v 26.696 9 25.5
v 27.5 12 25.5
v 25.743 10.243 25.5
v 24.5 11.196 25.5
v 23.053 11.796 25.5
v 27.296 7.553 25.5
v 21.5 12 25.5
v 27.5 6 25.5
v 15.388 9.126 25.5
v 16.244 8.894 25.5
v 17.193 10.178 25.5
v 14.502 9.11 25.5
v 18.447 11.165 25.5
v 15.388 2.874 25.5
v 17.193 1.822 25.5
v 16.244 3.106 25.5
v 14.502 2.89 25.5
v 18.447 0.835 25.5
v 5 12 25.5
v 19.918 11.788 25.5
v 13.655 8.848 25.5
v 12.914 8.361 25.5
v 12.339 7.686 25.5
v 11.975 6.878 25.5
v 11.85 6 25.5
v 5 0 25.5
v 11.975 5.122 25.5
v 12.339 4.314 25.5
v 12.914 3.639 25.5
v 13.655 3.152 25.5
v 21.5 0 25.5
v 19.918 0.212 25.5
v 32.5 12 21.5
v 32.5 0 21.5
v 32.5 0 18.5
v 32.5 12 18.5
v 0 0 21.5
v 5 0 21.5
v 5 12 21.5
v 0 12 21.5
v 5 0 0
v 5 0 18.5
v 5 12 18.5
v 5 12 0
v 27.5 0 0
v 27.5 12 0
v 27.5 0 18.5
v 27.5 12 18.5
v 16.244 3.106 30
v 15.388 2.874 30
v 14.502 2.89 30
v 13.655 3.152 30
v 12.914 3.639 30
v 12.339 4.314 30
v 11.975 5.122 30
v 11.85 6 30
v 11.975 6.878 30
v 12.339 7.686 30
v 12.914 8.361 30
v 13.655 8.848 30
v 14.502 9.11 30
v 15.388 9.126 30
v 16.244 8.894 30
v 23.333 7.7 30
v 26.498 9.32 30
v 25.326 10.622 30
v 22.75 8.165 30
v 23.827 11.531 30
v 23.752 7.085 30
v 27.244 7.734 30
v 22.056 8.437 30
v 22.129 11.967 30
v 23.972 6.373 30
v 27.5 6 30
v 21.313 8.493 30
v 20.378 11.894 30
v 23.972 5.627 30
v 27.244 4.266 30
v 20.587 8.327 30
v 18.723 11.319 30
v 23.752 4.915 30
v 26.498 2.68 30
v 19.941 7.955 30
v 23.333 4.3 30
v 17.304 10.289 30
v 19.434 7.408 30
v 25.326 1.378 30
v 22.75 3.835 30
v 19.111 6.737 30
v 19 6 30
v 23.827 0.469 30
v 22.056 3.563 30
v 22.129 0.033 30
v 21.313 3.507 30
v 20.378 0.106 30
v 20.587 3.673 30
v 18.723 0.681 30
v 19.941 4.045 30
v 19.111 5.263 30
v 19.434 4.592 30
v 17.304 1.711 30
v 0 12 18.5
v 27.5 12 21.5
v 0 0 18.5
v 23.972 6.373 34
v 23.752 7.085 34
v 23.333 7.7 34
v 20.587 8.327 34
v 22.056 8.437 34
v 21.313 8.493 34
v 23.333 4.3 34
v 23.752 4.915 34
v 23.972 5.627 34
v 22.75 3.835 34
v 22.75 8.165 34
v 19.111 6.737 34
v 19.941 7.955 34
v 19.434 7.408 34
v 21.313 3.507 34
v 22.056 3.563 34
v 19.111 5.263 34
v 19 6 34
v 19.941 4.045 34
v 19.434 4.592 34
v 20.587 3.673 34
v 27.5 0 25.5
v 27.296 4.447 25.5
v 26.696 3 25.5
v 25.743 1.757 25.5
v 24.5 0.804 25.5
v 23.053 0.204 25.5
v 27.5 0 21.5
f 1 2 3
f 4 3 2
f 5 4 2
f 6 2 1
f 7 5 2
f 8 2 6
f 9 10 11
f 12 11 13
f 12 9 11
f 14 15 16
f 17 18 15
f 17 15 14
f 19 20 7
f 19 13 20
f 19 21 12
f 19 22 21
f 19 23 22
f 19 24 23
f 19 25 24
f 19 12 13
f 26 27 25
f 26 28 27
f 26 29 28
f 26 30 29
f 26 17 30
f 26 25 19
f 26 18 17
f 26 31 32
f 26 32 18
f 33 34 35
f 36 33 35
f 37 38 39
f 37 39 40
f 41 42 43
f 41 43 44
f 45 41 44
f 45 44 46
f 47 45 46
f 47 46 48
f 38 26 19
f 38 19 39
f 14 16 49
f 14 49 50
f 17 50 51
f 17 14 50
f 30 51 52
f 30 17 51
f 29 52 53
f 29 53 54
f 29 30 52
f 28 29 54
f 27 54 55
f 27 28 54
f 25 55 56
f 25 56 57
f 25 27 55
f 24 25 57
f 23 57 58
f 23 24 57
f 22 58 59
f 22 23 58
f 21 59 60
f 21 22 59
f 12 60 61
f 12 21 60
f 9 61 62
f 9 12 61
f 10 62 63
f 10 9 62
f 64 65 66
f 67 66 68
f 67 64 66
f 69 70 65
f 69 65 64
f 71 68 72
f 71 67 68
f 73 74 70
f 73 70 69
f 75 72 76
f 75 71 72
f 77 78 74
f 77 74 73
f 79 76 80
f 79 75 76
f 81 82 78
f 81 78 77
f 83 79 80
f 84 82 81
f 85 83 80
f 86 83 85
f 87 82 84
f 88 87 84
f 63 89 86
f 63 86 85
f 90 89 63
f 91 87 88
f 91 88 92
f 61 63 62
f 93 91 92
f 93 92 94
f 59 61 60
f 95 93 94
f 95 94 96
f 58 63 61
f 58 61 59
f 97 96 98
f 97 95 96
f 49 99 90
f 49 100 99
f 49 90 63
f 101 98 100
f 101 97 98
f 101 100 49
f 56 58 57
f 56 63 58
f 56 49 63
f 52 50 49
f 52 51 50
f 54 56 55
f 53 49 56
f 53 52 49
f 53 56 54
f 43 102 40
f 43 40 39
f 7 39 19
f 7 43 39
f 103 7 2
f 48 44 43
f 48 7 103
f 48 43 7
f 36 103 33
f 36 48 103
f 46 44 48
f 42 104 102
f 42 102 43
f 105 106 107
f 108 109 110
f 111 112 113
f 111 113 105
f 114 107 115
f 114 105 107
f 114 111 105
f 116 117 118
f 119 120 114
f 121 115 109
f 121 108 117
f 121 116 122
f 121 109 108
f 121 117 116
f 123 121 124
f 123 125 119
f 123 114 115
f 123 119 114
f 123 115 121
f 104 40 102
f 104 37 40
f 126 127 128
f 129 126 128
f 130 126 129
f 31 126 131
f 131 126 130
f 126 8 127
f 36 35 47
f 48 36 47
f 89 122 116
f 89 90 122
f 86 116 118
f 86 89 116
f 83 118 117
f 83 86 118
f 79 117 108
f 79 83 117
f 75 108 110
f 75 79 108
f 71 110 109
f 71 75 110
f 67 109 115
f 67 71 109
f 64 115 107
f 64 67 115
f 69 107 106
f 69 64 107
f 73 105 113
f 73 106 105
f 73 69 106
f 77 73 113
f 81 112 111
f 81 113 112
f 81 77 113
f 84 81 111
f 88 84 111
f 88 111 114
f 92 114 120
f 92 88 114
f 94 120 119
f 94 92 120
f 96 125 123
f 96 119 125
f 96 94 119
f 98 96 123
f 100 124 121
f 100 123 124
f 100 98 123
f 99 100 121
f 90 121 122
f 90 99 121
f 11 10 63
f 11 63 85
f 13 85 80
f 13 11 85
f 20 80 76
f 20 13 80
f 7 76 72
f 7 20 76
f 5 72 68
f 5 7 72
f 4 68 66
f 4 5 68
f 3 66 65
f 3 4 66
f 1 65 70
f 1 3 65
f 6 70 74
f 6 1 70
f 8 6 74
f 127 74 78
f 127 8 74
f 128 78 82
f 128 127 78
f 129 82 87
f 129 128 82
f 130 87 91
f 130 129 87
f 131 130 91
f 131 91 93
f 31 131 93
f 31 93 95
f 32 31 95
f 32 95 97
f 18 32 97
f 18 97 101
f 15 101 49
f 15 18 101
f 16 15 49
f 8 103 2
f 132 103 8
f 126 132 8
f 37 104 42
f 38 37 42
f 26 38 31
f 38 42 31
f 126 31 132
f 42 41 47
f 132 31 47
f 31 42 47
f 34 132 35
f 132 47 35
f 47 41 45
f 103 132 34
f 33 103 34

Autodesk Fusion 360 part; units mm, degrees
sketch "Sketch1" plane through (0, 0, 0) normal (0, 1, 0) x (1, 0, 0)
  line L0 (0, 0) -> (5, 0)
  line L1 (5, 0) -> (27.5, 0)
  line L2 (27.5, 0) -> (27.5, -18.5)
  line L3 (5, -18.5) -> (5, 0)
  line L4 (5, -21.5) -> (0, -21.5)
  line L5 (0, -21.5) -> (0, -18.5)
  line L6 (0, -18.5) -> (5, -18.5)
  line L7 (27.5, -21.5) -> (32.5, -21.5)
  line L8 (32.5, -21.5) -> (32.5, -18.5)
  line L9 (32.5, -18.5) -> (27.5, -18.5)
  line L10 (27.5, -21.5) -> (27.5, -25.5)
  line L11 (27.5, -25.5) -> (5, -25.5)
  line L12 (5, -25.5) -> (5, -21.5)
  dimension "d1" = 5
  dimension "d2" = 22.5
  dimension "d3" = 18.5
  dimension "d4" = 3
  dimension "d5" = 5
  dimension "d6" = 3
  dimension "d7" = 5
  dimension "d8" = 22.5
  dimension "d9" = 4
extrude "Extrude1" add sketch "Sketch1" along normal blind 12
sketch "Sketch2" plane through (0, 0, 25.5) normal (0, 0, 1) x (-1, 0, 0)
  line L0 (-5, 0) -> (-27.5, 0)
  line L1 (-27.5, 0) -> (-27.5, -12)
  line L2 (-27.5, -12) -> (-5, -12)
  line L3 (-5, -12) -> (-5, 0)
  circle A0 centre (-21.5, -6) radius 6
  circle A1 centre (-15, -6) radius 3.15
  dimension "d14" = 6.3
extrude "Extrude2" add sketch "Sketch2" along normal blind 4.5 contours A0 A1 | A0 A1 picked at (-24.363, -5.7154) picked at (-16.388, -6.4033)
extrude "Extrude3" add sketch "Sketch2" along normal blind 4.5 contours A0 A1 picked at (-14.3919, -6.6826)
sketch "Sketch3" plane through (0, 0, 30) normal (0, 0, 1) x (-1, 0, 0)
  arc A0 (-16.244, -3.1061) -> (-16.244, -8.8939) centre (-21.5, -6) ccw
  arc A1 (-16.244, -8.8939) -> (-16.244, -3.1061) centre (-15, -6) ccw
  circle A2 centre (-21.5, -6) radius 2.5
  dimension "d17" = 5
extrude "Extrude4" add sketch "Sketch3" along normal blind 4 contours A2
